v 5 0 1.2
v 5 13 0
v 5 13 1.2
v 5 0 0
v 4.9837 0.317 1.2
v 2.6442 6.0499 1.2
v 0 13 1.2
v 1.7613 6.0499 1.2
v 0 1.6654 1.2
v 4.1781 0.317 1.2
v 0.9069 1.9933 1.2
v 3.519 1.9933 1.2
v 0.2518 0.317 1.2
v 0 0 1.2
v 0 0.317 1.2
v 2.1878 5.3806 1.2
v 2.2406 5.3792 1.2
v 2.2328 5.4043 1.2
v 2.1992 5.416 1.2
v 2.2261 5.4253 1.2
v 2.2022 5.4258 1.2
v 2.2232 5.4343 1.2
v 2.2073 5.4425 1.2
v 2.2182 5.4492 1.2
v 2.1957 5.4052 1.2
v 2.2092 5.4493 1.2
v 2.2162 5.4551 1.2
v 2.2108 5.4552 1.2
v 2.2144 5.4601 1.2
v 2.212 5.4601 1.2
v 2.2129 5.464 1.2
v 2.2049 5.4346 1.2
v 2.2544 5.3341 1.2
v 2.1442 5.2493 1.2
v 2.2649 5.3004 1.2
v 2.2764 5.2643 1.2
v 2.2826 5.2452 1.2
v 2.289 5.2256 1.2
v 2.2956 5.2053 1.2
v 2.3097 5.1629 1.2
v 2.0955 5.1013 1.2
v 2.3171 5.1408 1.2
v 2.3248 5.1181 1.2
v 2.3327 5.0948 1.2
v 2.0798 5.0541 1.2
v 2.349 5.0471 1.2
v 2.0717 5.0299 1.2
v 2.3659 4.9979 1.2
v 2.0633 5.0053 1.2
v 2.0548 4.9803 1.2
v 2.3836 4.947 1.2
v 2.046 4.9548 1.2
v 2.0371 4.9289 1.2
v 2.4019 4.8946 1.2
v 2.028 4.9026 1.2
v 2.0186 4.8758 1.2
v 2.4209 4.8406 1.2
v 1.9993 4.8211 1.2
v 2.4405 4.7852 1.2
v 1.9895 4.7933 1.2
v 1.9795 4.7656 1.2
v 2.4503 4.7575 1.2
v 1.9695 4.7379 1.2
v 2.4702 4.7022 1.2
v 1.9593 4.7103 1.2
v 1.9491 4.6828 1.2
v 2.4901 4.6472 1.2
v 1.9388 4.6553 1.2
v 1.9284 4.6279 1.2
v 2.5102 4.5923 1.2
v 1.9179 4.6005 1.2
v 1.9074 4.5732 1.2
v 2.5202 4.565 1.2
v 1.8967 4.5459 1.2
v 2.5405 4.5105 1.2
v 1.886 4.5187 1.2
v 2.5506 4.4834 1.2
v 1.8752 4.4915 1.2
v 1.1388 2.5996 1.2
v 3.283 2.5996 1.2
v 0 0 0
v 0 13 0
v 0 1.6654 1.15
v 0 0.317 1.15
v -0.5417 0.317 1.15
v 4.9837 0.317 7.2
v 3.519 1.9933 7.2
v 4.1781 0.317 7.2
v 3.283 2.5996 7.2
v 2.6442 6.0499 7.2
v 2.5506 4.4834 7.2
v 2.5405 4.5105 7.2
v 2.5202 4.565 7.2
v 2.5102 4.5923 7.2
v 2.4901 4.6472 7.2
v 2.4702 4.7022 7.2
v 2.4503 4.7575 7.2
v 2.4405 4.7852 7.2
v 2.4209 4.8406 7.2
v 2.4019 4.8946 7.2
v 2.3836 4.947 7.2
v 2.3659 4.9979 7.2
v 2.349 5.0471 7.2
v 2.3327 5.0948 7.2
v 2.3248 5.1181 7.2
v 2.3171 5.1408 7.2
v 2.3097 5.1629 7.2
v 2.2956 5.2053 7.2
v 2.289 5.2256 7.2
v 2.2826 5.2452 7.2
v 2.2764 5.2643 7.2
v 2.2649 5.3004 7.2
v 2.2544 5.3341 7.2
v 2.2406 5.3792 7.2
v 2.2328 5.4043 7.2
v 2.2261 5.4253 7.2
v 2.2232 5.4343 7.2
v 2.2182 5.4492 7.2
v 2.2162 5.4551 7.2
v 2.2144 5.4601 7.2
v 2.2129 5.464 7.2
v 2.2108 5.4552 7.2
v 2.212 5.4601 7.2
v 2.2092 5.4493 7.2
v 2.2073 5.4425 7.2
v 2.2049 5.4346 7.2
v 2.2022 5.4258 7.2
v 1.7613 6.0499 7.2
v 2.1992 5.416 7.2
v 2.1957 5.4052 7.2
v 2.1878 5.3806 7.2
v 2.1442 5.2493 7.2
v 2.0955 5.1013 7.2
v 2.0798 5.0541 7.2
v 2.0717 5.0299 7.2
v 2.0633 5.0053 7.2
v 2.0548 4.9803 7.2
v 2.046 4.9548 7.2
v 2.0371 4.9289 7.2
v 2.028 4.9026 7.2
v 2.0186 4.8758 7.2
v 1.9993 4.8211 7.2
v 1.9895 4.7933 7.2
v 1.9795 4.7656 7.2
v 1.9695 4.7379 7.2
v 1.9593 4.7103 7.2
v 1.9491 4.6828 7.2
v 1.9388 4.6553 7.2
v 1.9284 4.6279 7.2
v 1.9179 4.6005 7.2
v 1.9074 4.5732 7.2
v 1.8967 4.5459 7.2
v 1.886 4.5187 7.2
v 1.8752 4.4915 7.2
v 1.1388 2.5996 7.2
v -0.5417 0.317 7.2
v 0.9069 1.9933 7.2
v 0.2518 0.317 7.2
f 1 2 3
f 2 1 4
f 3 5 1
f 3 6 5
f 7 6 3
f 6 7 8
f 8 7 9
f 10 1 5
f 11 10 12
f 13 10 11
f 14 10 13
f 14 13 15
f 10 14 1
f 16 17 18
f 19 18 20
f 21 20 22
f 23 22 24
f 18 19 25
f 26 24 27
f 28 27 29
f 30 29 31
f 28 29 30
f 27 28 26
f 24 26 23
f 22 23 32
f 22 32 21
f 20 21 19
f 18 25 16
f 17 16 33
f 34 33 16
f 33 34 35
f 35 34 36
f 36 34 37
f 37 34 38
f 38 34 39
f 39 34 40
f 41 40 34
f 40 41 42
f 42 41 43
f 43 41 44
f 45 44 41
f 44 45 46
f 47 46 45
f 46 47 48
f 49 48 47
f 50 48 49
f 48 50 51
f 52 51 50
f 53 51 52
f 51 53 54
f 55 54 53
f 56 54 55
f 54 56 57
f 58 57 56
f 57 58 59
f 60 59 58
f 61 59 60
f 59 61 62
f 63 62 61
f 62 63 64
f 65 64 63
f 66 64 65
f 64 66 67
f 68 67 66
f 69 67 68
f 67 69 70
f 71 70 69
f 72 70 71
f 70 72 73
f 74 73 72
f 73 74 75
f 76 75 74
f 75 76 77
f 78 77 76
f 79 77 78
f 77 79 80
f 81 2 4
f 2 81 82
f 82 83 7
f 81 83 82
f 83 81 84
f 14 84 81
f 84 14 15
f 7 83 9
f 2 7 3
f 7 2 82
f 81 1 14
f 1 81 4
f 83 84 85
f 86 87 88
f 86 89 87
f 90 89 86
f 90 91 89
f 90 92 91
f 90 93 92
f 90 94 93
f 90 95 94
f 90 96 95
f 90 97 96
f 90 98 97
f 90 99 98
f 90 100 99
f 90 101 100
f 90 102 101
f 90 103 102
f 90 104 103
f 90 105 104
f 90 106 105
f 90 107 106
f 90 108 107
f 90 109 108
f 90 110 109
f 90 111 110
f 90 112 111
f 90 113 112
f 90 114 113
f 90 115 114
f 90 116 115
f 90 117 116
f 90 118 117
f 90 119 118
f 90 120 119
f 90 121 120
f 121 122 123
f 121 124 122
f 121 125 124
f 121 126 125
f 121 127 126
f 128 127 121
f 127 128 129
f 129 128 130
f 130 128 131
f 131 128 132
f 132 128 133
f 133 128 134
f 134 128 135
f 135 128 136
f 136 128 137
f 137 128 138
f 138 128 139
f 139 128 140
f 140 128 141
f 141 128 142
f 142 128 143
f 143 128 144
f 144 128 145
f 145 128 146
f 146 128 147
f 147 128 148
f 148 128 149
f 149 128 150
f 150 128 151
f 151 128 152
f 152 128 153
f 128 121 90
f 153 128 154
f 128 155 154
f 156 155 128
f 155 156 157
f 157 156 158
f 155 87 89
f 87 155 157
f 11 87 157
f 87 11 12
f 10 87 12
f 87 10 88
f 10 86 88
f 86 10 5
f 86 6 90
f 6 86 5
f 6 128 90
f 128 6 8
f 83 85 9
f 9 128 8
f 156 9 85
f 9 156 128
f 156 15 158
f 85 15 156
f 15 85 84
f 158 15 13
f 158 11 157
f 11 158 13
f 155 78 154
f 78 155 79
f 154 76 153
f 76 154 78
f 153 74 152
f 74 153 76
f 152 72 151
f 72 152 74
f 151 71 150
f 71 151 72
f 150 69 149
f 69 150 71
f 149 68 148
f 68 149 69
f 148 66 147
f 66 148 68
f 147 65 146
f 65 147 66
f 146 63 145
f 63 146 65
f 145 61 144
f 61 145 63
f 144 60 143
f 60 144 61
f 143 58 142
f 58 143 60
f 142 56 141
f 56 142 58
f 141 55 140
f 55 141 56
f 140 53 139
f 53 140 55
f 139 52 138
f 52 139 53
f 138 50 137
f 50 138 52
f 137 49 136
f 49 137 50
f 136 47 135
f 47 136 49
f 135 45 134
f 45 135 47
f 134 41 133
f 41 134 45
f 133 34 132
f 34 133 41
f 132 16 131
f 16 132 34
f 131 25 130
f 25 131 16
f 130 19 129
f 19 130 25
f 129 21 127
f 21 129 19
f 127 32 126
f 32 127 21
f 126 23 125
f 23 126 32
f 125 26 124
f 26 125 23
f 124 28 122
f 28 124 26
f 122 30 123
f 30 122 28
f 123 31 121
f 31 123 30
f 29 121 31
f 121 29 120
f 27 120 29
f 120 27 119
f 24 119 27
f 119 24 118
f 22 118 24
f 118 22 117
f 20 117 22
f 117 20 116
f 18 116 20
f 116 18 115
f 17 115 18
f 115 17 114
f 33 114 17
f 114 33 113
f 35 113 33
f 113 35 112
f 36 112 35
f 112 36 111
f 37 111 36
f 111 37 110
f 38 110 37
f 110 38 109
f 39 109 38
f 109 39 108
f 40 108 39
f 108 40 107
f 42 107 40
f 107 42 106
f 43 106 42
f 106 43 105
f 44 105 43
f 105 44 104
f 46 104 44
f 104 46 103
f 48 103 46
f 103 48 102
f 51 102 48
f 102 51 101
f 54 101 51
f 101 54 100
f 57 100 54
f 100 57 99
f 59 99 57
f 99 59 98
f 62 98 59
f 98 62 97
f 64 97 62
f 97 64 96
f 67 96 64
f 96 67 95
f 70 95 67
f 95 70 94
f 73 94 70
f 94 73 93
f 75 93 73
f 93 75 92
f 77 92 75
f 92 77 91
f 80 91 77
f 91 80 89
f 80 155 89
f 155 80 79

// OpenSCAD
// letter_strip.scad — 把多个单字母块按真实字距排成一排，一次打印后掰开
//
// 用途：验证「块宽 = advance」能否复刻整块方案的字距。
// 块与块之间留 gap（默认 0.25mm）仅为切片可分，掰开后贴合拼装即恢复设计字距。
//
// 所有数组由 build.py 按字体度量算好传入，本文件不含任何字体假设。

letters   = is_undef(letters)   ? ["A"] : letters;
widths    = is_undef(widths)    ? [5.0] : widths;
xmins     = is_undef(xmins)     ? [0]   : xmins;
xmaxs     = is_undef(xmaxs)     ? [5.0] : xmaxs;
offsets   = is_undef(offsets)   ? [0]   : offsets;

block_depth     = is_undef(block_depth)     ? 13.0  : block_depth;
plate_thickness = is_undef(plate_thickness) ? 1.2   : plate_thickness;
letter_height   = is_undef(letter_height)   ? 6.0   : letter_height;
letter_size     = is_undef(letter_size)     ? 6.0   : letter_size;
baseline_y      = is_undef(baseline_y)      ? 0.317 : baseline_y;
font_family     = is_undef(font_family)     ? "Arial" : font_family;
font_style      = is_undef(font_style)      ? "Regular" : font_style;
overlap         = 0.05;

$fa = 4;
$fs = 0.3;

// 注意：这里不能再套一层 mirror。
// 每块内部已经镜像过字形（印章必需），若整体再 mirror 一次会抵消掉。
// 「顺序也要反」这件事由 build.py 传参时把字母序列倒过来实现：
// 要印 AVILOW，STL 里从左到右存成 W O L I V A（字形仍是反的），
// 压印翻转后纸上才是 A V I L O W 正读。
for (i = [0 : len(letters) - 1]) {
    translate([offsets[i], 0, 0]) {
        cube([widths[i], block_depth, plate_thickness]);
        translate([0, 0, plate_thickness - overlap])
            linear_extrude(height = letter_height + overlap)
                translate([xmins[i] + xmaxs[i], 0, 0])
                    mirror([1, 0, 0])
                        translate([0, baseline_y, 0])
                            text(letters[i],
                                 size   = letter_size,
                                 font   = str(font_family, ":style=", font_style),
                                 halign = "left",
                                 valign = "baseline");
    }
}
